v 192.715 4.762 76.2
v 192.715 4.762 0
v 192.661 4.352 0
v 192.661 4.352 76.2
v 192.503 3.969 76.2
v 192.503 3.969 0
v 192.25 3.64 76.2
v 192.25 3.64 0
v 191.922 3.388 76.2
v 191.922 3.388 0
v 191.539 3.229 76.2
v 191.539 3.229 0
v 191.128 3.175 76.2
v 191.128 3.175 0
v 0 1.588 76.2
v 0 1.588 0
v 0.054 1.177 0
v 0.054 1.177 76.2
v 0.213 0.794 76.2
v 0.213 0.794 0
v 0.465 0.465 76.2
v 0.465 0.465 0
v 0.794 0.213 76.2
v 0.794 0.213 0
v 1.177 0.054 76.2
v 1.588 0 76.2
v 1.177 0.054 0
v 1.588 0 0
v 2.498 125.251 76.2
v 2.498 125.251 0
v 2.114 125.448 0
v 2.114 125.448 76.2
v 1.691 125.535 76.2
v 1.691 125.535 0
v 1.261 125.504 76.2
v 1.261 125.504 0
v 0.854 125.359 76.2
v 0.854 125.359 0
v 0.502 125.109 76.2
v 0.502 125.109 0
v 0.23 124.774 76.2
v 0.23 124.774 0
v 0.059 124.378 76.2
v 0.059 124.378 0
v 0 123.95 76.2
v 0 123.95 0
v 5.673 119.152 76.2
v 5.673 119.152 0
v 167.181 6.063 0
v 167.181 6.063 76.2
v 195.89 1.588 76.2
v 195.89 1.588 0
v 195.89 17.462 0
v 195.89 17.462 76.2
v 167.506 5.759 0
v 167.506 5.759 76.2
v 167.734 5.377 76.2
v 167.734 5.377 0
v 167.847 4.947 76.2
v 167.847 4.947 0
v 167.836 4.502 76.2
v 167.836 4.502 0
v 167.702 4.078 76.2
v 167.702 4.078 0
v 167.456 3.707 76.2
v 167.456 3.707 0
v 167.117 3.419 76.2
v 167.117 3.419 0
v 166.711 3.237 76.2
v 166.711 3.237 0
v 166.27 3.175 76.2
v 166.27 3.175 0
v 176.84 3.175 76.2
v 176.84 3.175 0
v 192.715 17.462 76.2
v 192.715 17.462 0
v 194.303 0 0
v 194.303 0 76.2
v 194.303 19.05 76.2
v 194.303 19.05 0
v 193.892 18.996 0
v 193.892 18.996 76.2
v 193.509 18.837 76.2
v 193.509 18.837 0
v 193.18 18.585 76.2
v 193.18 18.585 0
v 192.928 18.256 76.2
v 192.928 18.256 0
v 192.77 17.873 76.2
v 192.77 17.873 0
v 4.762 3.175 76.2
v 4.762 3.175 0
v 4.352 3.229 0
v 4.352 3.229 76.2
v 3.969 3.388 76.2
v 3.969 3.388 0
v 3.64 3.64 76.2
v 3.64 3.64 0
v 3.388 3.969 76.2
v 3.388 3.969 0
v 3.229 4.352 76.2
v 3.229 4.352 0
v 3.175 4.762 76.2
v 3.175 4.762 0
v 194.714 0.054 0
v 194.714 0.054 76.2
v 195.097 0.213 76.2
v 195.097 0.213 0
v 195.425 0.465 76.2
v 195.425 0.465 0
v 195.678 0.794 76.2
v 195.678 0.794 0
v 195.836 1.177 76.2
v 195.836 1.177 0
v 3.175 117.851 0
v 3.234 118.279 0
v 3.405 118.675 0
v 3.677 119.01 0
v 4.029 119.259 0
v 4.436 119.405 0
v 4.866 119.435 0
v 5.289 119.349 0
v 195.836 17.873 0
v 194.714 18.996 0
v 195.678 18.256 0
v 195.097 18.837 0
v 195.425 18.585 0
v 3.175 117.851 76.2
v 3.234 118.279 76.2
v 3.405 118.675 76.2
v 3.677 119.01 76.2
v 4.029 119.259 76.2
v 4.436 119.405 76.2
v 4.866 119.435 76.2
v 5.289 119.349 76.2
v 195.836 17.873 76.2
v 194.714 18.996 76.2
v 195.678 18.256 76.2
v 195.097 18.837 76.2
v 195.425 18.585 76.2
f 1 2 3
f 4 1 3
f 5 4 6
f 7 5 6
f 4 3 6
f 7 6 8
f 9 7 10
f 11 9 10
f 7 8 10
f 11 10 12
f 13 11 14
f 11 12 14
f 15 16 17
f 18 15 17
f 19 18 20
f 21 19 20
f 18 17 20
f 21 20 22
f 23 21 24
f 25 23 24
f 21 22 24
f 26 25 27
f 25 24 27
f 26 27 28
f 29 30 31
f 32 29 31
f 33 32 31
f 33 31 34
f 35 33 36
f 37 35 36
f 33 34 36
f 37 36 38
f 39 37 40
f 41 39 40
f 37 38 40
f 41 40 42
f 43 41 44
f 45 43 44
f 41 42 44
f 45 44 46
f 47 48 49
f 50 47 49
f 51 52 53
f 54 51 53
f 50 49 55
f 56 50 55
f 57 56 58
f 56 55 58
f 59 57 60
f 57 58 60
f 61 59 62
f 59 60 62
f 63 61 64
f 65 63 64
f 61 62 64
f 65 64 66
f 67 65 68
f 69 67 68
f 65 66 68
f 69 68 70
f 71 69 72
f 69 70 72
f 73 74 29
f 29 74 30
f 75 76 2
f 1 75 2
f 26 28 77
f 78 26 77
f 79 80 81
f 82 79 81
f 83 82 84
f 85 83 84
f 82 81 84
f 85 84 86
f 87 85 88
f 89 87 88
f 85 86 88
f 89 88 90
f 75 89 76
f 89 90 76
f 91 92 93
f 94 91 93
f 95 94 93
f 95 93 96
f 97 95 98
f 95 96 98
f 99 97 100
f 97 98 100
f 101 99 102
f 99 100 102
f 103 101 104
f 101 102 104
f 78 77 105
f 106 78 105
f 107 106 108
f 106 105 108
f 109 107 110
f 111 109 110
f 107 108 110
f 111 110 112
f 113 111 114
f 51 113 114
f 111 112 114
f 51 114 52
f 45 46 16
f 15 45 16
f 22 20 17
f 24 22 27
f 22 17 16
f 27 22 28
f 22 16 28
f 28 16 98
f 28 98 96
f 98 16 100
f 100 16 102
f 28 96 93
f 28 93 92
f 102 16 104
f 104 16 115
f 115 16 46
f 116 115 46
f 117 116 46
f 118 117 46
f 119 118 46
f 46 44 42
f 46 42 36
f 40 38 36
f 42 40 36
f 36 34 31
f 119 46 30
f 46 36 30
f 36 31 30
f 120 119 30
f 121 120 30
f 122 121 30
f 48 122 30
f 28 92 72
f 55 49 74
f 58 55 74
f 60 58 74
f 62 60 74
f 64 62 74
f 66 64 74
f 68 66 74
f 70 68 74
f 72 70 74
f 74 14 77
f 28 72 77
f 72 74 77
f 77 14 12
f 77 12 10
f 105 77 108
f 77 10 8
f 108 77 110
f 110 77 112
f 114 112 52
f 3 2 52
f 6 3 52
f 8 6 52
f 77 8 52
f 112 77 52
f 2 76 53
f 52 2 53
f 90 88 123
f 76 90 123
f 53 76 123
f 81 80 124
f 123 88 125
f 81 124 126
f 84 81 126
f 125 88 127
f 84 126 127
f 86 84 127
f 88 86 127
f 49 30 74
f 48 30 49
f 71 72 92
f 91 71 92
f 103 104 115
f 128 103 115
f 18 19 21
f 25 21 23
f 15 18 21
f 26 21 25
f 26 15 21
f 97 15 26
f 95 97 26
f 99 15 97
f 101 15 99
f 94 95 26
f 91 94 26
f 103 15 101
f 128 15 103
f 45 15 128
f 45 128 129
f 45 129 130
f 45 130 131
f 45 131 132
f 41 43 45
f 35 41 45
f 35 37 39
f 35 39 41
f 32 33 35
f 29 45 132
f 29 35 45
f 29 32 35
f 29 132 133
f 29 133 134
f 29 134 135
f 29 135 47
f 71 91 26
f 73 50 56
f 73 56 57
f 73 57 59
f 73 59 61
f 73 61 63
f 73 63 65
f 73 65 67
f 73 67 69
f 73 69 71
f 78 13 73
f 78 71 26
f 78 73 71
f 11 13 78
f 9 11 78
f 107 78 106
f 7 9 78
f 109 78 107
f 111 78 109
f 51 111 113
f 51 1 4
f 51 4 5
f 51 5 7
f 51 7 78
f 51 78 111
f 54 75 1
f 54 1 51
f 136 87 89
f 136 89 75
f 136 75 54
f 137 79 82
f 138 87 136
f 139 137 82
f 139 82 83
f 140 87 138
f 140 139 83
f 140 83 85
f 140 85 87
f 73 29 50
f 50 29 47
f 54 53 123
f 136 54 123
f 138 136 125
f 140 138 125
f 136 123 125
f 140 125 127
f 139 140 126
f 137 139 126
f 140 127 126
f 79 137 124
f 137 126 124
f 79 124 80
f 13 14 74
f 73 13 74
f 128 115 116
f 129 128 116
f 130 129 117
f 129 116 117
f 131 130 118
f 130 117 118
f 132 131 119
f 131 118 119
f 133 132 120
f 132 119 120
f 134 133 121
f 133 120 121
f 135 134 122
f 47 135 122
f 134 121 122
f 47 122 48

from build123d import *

# Parameters (mm, degrees)
F1_DEPTH = 76.2


with BuildPart() as f1:
    # F0 (on Top) → F1 (new body)
    with BuildSketch(Plane.XY):
        with BuildLine():
            Line((0, 123.950441), (0, 1.5875))
            ThreePointArc((0, 1.5875), (0.464968, 0.464968), (1.5875, 0))
            Line((1.5875, 0), (181.374797, 0))
            Line((181.374797, 0), (194.302927, 0))
            ThreePointArc((194.302927, 0), (195.425459, 0.464968), (195.890427, 1.5875))
            Line((195.890427, 1.5875), (195.890427, 17.4625))
            ThreePointArc((195.890427, 17.4625), (195.425459, 18.585032), (194.302927, 19.05))
            ThreePointArc((194.302927, 19.05), (193.180395, 18.585032), (192.715427, 17.4625))
            Line((192.715427, 17.4625), (192.715427, 4.7625))
            ThreePointArc((192.715427, 4.7625), (192.250459, 3.639968), (191.127927, 3.175))
            Line((191.127927, 3.175), (176.840427, 3.175))
            Line((176.840427, 3.175), (2.498053, 125.250845))
            ThreePointArc((2.498053, 125.250845), (0.854474, 125.358571), (0, 123.950441))
        make_face()
        with BuildLine():
            Line((5.673053, 119.151726), (167.180629, 6.062904))
            ThreePointArc((167.180629, 6.062904), (167.784102, 4.28513), (166.270077, 3.175))
            Line((166.270077, 3.175), (4.7625, 3.175))
            ThreePointArc((4.7625, 3.175), (3.639968, 3.639968), (3.175, 4.7625))
            Line((3.175, 4.7625), (3.175, 117.851323))
            ThreePointArc((3.175, 117.851323), (4.029474, 119.259452), (5.673053, 119.151726))
        make_face(mode=Mode.SUBTRACT)
    extrude(amount=F1_DEPTH)


solid = f1.part
